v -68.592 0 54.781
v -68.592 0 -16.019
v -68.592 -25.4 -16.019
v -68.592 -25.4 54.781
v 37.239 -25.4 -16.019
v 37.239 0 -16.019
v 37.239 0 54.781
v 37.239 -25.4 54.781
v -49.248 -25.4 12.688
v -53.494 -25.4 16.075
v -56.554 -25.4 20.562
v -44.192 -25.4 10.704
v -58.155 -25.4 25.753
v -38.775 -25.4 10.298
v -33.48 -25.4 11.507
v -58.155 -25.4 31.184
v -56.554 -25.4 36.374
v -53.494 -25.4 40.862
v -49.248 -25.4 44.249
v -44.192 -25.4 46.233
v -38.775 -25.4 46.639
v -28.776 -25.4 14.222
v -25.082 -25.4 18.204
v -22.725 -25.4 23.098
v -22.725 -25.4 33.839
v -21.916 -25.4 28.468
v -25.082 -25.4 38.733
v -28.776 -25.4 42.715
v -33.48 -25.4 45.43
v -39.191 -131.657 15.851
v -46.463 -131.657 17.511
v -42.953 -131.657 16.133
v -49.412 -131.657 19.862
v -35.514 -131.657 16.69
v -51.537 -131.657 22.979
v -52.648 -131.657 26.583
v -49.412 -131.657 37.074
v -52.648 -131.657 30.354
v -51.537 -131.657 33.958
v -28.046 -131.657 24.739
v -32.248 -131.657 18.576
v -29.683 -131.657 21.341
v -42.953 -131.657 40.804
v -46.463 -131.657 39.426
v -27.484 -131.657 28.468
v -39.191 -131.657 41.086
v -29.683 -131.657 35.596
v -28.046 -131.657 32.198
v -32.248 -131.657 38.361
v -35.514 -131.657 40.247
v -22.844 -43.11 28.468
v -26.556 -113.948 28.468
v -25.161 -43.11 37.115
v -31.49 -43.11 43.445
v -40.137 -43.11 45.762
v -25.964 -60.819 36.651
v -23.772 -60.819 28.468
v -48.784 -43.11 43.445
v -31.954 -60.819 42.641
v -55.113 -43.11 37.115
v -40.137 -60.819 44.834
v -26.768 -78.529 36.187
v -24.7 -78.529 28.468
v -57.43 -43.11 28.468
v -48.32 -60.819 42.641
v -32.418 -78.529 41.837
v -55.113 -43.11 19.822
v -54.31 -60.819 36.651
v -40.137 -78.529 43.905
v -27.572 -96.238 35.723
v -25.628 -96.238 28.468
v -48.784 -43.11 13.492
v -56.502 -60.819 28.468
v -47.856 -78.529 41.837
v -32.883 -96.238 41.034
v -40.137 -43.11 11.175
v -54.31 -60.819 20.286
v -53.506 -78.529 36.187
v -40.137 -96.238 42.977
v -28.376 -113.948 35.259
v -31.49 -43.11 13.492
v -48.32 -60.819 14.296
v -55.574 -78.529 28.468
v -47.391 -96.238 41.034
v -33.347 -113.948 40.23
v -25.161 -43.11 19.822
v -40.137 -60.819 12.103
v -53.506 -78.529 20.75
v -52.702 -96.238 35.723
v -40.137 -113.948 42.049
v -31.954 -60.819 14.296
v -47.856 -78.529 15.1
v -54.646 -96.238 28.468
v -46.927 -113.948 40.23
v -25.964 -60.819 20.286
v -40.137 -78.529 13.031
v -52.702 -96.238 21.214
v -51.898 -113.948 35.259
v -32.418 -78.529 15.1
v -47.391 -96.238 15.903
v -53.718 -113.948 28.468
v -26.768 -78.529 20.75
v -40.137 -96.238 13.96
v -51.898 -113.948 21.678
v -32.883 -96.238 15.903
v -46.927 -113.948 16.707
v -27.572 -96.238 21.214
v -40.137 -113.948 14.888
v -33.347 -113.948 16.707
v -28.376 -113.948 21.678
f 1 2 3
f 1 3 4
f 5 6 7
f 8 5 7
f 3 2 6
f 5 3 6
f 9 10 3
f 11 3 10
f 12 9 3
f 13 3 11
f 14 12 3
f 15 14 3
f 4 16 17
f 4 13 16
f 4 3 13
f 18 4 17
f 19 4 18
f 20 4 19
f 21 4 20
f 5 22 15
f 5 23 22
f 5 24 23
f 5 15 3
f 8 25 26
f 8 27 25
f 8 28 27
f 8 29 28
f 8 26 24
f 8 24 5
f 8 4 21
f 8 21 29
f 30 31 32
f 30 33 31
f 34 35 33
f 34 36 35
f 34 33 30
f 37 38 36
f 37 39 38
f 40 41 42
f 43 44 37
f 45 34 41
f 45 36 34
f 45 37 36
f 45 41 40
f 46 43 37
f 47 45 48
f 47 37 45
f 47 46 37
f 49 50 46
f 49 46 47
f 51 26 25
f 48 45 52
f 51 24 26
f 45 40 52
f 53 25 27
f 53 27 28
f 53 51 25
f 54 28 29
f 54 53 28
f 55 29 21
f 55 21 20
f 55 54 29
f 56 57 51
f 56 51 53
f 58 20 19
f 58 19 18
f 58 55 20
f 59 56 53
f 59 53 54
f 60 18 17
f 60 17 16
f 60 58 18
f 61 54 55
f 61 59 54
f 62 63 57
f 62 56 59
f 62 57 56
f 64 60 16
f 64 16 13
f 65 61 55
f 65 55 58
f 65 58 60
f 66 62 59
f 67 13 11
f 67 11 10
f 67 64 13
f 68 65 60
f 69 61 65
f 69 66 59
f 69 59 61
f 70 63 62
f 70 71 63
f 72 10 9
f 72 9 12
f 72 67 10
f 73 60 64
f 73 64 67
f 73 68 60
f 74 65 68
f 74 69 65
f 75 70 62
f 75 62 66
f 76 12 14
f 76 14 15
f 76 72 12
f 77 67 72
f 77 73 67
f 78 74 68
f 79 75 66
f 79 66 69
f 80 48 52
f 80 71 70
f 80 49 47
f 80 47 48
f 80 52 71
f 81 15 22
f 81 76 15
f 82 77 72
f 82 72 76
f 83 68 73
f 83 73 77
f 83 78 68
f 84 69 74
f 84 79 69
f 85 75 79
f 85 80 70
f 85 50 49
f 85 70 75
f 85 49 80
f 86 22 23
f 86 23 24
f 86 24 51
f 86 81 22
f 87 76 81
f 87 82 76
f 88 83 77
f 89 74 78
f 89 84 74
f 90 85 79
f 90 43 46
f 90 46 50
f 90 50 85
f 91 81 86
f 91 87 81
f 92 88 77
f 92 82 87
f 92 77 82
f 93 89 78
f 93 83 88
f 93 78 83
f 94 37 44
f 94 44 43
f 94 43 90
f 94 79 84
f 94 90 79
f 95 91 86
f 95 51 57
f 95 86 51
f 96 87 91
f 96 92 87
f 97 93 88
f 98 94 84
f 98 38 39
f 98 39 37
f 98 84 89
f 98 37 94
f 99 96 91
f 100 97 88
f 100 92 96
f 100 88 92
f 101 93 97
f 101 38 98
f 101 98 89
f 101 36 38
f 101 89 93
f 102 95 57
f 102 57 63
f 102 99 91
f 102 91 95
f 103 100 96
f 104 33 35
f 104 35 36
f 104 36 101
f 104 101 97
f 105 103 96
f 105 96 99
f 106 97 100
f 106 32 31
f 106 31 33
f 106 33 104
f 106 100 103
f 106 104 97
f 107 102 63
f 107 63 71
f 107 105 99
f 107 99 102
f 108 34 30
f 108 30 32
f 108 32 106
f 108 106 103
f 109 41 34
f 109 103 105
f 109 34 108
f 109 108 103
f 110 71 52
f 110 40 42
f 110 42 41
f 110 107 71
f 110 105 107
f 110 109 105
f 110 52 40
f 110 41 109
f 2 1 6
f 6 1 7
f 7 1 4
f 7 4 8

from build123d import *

# Parameters (mm, degrees)
F0_W     = 105.8307476342
F0_H     = 70.8000324667
F1_DEPTH = 25.4
F2_R     = 18.2213910868
F3_DEPTH = 106.25713
F3_TAPER = 3


# Not quite as in the source:
# - the program builds the solid bodies; features that only make, move or delete a surface that nothing else refers to are left out


with BuildPart() as f1:
    # F0 (on Front) → F1 (new body)
    with BuildSketch(Plane.XZ):
        with Locations((-15.6768169254, 19.381063059)):
            Rectangle(F0_W, F0_H)
    extrude(amount=F1_DEPTH)

    # F2 (on face) → F3 (join)
    with BuildSketch(Plane.XZ.offset(25.4)):
        with Locations((-40.1370152831, 28.4684468061)):
            Circle(F2_R)
    extrude(amount=F3_DEPTH, taper=F3_TAPER)


solid = f1.part
